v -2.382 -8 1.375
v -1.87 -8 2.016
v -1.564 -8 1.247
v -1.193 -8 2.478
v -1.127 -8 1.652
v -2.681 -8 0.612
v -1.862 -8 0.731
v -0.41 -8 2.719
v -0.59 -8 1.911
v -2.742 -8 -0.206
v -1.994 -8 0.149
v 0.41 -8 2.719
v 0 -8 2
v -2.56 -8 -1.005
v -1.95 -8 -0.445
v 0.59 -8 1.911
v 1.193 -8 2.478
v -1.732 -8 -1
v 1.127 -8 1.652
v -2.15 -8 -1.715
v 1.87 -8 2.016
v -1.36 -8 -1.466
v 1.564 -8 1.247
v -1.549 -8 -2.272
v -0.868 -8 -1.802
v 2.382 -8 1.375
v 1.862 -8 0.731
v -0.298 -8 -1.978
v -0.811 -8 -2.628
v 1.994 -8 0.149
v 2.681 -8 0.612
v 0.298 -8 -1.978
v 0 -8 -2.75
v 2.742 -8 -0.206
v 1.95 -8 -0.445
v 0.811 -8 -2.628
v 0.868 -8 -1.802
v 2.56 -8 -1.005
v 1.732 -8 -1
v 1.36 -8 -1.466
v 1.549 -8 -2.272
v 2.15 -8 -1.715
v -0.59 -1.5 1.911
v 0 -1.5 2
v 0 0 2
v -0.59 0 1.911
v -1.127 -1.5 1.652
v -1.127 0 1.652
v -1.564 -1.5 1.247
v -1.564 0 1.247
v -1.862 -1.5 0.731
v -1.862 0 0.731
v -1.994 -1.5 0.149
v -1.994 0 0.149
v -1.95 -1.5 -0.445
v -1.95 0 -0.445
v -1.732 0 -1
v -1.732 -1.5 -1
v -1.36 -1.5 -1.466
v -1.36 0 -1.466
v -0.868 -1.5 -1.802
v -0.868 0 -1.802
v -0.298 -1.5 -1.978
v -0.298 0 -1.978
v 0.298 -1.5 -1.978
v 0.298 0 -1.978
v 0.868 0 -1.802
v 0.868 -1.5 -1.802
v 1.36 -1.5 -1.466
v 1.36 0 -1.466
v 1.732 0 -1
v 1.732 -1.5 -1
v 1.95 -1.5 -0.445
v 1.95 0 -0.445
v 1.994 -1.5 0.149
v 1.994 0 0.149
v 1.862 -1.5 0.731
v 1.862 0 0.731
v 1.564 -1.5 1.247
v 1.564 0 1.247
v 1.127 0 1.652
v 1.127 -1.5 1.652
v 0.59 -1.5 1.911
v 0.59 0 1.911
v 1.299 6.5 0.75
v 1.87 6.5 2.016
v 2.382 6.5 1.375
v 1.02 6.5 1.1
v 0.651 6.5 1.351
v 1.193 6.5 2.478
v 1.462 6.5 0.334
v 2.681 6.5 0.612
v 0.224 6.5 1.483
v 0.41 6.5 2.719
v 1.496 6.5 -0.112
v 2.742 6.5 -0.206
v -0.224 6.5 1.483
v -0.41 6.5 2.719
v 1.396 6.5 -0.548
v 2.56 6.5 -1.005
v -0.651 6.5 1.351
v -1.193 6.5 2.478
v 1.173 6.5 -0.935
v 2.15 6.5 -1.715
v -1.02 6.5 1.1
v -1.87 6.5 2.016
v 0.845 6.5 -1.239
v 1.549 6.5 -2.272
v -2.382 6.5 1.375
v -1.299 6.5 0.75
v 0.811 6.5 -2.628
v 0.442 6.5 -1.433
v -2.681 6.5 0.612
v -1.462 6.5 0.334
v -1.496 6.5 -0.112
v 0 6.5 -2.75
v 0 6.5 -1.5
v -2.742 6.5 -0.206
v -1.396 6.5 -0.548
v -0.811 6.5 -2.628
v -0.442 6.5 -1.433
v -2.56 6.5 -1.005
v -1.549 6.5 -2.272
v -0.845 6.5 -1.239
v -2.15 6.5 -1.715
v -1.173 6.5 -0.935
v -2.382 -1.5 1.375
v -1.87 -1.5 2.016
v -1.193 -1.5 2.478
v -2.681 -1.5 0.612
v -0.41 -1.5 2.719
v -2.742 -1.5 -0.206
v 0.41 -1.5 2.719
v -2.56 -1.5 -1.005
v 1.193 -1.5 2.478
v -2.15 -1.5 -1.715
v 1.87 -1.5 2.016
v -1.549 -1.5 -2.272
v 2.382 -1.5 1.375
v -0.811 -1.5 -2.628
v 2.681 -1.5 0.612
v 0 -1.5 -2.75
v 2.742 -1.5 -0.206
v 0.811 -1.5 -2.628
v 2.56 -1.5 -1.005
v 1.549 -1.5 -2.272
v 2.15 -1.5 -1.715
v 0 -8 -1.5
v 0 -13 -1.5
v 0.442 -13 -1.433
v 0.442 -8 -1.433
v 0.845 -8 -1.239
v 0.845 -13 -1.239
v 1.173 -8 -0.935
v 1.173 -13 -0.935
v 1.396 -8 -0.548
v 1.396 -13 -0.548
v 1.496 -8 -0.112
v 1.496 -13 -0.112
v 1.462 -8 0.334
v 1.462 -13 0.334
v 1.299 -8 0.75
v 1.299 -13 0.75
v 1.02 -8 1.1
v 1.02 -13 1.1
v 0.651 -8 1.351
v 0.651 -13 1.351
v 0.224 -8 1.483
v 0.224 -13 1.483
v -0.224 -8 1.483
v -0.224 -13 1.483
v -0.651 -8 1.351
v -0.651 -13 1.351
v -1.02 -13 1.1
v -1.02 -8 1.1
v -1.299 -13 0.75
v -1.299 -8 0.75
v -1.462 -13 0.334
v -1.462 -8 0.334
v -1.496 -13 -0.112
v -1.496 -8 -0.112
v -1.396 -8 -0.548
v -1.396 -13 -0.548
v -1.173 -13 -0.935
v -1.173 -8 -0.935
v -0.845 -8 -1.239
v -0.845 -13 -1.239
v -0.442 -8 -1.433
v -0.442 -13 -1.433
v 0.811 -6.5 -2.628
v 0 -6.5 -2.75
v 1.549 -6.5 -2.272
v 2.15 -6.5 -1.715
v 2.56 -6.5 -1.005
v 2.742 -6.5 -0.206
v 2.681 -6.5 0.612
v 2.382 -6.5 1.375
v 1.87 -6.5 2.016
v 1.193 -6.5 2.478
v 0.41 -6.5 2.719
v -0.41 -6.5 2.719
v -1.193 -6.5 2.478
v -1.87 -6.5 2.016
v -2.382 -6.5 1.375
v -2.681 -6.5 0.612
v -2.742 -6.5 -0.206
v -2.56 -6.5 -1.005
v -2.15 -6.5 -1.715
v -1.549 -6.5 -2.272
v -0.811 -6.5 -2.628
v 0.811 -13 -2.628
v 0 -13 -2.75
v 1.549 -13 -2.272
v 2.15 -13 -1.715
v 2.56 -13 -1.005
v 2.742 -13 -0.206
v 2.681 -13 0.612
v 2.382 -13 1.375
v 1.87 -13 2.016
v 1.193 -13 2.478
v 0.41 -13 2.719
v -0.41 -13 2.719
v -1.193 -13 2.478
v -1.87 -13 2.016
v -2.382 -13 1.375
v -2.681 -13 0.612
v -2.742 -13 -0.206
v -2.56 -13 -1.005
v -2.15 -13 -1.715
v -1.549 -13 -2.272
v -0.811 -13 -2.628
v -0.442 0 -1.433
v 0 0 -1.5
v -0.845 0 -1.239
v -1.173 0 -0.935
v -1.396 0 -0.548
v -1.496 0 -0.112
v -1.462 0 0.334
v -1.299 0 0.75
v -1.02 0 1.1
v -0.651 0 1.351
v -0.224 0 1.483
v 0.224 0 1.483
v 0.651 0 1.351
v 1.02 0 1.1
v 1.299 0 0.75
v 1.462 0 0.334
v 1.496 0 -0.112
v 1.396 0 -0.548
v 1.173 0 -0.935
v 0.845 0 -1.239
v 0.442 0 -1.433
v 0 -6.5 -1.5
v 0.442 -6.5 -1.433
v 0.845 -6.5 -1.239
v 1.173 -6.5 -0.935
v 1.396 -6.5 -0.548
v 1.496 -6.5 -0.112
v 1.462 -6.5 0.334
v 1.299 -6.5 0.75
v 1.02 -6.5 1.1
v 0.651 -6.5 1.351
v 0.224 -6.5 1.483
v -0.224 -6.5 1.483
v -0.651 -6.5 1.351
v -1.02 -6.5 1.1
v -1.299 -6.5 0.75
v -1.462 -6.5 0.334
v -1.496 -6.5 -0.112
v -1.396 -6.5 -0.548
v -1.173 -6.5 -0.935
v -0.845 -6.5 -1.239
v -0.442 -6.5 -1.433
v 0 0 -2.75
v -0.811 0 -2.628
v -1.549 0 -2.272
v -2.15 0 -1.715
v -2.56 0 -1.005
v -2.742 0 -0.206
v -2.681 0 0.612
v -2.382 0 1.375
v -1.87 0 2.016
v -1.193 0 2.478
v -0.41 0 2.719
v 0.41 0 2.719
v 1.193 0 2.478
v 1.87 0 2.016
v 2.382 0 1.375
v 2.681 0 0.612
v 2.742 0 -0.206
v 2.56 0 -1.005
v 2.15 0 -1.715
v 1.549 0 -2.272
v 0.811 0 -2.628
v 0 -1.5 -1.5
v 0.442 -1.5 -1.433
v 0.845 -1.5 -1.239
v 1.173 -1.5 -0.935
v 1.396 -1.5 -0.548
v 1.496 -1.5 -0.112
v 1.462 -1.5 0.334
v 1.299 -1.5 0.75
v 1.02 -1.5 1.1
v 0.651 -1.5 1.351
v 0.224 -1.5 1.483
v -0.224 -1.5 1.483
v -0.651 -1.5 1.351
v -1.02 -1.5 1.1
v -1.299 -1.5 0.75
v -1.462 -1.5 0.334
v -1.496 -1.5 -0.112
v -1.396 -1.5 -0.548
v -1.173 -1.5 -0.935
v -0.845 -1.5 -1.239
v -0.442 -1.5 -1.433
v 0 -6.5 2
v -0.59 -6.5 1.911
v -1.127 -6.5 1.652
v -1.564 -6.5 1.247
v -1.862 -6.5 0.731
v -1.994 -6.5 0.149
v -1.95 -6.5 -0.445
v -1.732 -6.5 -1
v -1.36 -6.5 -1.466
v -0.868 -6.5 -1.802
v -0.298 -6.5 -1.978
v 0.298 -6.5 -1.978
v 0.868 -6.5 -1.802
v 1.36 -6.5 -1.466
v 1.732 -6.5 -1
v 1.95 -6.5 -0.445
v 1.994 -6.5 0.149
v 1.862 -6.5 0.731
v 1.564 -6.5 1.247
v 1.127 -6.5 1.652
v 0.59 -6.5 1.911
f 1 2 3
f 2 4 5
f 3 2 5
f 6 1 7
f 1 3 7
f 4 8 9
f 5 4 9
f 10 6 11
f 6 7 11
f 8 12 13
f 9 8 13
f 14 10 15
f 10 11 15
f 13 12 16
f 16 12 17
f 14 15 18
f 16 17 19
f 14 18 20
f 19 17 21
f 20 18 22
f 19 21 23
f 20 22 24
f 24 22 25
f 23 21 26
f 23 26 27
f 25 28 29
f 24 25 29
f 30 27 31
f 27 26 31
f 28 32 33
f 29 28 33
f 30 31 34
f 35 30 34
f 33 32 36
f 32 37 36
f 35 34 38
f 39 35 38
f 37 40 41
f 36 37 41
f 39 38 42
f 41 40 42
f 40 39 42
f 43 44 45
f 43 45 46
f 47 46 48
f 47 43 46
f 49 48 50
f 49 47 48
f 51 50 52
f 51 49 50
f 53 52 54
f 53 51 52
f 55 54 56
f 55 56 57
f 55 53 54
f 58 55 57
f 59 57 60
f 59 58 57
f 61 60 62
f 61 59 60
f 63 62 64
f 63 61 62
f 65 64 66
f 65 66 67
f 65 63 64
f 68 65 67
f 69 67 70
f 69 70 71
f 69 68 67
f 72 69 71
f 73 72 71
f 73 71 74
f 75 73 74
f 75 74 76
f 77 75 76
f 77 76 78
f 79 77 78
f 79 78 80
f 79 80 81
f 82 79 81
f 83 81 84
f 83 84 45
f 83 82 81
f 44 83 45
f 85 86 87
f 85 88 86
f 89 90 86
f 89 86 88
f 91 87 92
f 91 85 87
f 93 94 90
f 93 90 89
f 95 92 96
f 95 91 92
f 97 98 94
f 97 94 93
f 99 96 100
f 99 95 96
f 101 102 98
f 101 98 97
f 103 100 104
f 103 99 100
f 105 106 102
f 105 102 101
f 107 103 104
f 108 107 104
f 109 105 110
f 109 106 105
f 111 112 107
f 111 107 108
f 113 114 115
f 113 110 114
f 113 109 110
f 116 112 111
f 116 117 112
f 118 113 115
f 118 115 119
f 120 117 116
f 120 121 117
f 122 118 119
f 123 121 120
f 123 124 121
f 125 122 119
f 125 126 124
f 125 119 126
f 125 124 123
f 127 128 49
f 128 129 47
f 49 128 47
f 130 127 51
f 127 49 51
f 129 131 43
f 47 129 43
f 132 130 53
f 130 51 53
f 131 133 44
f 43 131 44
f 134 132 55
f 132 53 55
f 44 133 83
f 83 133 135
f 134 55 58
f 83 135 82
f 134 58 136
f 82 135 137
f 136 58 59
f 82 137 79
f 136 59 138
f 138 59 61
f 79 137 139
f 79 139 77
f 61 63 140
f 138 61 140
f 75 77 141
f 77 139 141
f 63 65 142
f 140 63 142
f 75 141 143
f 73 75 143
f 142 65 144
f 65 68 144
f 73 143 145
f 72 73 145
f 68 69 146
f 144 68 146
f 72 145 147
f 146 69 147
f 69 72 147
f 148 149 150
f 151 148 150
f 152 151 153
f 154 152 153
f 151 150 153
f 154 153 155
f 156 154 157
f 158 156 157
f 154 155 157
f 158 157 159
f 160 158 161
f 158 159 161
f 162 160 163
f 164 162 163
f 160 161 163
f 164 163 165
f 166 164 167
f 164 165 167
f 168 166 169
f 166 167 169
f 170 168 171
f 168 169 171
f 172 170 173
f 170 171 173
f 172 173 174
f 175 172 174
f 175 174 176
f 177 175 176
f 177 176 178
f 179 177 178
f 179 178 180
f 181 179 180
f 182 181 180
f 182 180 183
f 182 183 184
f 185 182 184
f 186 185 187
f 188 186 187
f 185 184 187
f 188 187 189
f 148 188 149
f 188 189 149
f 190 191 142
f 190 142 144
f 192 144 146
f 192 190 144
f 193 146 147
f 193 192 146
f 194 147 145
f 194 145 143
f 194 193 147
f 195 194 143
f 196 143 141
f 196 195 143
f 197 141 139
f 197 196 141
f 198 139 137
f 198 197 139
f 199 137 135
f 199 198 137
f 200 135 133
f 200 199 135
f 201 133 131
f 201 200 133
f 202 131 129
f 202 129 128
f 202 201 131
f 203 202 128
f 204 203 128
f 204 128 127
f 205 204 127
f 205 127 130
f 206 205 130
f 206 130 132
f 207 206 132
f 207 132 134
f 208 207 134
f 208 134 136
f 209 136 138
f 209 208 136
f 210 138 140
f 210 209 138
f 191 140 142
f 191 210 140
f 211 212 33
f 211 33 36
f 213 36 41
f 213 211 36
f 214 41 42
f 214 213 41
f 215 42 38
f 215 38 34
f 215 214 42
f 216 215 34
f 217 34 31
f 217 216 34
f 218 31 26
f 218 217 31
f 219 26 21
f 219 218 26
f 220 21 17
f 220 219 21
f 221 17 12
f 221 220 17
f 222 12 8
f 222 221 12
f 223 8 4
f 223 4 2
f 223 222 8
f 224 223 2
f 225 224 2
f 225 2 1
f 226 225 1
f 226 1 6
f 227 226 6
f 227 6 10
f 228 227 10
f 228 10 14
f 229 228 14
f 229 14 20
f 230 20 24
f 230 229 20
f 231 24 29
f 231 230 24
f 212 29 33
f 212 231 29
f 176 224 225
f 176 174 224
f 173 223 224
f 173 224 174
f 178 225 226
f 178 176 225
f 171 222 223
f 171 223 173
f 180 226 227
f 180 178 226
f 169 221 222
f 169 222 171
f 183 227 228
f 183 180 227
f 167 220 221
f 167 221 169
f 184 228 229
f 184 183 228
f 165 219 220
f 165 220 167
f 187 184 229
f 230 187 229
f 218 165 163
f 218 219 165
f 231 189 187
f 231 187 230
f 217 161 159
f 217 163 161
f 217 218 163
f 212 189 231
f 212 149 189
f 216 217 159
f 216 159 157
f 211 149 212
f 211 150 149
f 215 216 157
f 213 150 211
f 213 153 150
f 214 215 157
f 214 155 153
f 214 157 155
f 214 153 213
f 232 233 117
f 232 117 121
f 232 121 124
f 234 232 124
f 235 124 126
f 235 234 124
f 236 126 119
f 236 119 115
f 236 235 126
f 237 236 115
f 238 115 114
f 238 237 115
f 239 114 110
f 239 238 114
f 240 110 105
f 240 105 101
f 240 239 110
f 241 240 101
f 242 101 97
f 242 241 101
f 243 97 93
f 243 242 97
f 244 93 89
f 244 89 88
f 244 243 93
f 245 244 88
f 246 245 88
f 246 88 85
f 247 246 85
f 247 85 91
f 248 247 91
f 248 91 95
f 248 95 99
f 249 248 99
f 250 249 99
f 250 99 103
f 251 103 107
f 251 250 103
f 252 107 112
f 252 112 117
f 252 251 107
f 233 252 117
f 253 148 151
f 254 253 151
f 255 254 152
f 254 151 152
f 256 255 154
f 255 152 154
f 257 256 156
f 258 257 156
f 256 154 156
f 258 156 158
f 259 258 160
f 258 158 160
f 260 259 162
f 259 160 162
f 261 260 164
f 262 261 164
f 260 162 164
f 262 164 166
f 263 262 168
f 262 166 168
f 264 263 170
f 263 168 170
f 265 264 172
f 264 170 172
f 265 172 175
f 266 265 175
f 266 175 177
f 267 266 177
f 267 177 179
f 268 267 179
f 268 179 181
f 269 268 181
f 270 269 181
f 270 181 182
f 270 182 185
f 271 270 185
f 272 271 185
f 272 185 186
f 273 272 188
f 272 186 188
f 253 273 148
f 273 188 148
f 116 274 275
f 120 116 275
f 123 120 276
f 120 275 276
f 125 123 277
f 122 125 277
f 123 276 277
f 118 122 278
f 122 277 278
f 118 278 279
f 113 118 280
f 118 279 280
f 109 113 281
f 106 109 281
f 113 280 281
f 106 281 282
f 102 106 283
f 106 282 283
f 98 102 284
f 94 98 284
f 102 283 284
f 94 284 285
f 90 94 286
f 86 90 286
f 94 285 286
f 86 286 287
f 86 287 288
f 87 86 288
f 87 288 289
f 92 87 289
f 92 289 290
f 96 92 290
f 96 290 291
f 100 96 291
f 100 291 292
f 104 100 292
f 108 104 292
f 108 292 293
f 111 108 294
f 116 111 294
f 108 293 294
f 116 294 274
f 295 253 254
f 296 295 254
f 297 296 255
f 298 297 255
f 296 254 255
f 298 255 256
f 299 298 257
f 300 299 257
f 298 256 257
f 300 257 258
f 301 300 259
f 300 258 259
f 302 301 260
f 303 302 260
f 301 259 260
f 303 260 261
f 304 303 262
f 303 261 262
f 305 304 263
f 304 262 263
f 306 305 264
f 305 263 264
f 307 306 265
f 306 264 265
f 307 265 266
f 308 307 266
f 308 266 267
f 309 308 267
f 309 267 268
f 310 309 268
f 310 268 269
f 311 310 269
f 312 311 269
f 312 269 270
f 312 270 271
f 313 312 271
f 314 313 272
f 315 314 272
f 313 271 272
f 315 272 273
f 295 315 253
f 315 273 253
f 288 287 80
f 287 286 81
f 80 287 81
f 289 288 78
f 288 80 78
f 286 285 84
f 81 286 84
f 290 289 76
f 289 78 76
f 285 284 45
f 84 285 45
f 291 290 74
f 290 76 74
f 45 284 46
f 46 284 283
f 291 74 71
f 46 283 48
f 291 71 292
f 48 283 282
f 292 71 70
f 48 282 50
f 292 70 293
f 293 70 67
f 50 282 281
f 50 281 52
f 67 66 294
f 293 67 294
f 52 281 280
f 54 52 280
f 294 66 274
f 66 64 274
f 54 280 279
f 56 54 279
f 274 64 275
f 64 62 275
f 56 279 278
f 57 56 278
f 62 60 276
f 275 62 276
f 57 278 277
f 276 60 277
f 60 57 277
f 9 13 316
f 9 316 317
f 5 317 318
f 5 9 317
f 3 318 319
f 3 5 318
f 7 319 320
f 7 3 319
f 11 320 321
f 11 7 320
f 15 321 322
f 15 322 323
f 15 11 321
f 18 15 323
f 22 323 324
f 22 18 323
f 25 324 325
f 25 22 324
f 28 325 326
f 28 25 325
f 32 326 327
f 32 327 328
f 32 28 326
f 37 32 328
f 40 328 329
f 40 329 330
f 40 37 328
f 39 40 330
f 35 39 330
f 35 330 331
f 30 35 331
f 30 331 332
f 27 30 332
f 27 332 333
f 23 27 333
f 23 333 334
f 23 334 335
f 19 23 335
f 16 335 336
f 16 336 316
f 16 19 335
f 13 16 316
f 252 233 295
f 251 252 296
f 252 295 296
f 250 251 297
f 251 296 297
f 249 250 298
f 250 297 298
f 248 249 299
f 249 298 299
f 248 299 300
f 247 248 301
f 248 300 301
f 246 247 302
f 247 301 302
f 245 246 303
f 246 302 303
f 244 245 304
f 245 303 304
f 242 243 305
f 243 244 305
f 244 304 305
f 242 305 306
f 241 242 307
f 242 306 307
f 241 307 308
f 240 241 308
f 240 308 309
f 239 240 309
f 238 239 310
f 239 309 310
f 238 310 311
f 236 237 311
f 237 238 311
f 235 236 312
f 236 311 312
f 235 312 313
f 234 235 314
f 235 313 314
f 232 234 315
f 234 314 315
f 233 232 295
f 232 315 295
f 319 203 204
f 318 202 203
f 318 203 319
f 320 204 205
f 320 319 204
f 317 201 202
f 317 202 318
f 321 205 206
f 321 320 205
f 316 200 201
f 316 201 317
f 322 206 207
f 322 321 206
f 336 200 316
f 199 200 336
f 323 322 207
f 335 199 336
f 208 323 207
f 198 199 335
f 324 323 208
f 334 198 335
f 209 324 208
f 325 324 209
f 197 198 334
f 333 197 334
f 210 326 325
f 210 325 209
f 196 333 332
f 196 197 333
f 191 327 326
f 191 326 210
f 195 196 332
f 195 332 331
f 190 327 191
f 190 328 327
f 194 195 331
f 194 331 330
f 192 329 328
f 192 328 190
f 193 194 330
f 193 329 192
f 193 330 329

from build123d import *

# Parameters (mm, degrees)
SKETCH_1_R      = 2.75
SKETCH_1_R_2    = 1.5
EXTRUDE_1_DEPTH = 6.5
EXTRUDE_START   = 1.5
SKETCH_2_R      = 2
SKETCH_2_R_2    = 1.5
EXTRUDE_2_DEPTH = 1.5
EXTRUDE_START_2 = 5
SKETCH_3_R      = 2.75
SKETCH_3_R_2    = 1.5
EXTRUDE_3_DEPTH = 5
SKETCH_4_R      = 2
SKETCH_4_R_2    = 1.5
EXTRUDE_4_DEPTH = 1.5
SKETCH_5_R      = 2.75
SKETCH_5_R_2    = 1.5
EXTRUDE_5_DEPTH = 5


with BuildPart() as part:
    # 草图1 → 凸台-拉伸1 (new body)
    with BuildSketch(Plane(origin=(0, 0, 0), x_dir=(1, 0, 0), z_dir=(0, 1, 0))):
        with Locations(Location((0, 0, 0), (0, 0, 90))):
            Circle(SKETCH_1_R)
        with Locations(Location((0, 0, 0), (0, 0, 90))):
            Circle(SKETCH_1_R_2, mode=Mode.SUBTRACT)
    extrude(amount=EXTRUDE_1_DEPTH)

    # 草图2 → 凸台-拉伸2 (add)
    with BuildSketch(Plane.XZ.offset(EXTRUDE_START)):
        with Locations(Location((0, 0, 0), (0, 0, 90))):
            Circle(SKETCH_2_R)
        with Locations(Location((0, 0, 0), (0, 0, 270))):
            Circle(SKETCH_2_R_2, mode=Mode.SUBTRACT)
    extrude(amount=-EXTRUDE_2_DEPTH)

    # 草图3 → 凸台-拉伸3 (add)
    with BuildSketch(Plane.XZ.offset(1.5).offset(EXTRUDE_START_2)):
        with Locations(Location((0, 0, 0), (0, 0, 270))):
            Circle(SKETCH_3_R)
        with Locations(Location((0, 0, 0), (0, 0, 270))):
            Circle(SKETCH_3_R_2, mode=Mode.SUBTRACT)
    extrude(amount=-EXTRUDE_3_DEPTH)

    # 草图4 → 凸台-拉伸4 (add)
    with BuildSketch(Plane.XZ.offset(6.5).offset(EXTRUDE_START)):
        with Locations(Location((0, 0, 0), (0, 0, 90))):
            Circle(SKETCH_4_R)
        with Locations(Location((0, 0, 0), (0, 0, 270))):
            Circle(SKETCH_4_R_2, mode=Mode.SUBTRACT)
    extrude(amount=-EXTRUDE_4_DEPTH)

    # 草图5 → 凸台-拉伸5 (add)
    with BuildSketch(Plane.XZ.offset(8).offset(EXTRUDE_START_2)):
        with Locations(Location((0, 0, 0), (0, 0, 270))):
            Circle(SKETCH_5_R)
        with Locations(Location((0, 0, 0), (0, 0, 270))):
            Circle(SKETCH_5_R_2, mode=Mode.SUBTRACT)
    extrude(amount=-EXTRUDE_5_DEPTH)


solid = part.part
